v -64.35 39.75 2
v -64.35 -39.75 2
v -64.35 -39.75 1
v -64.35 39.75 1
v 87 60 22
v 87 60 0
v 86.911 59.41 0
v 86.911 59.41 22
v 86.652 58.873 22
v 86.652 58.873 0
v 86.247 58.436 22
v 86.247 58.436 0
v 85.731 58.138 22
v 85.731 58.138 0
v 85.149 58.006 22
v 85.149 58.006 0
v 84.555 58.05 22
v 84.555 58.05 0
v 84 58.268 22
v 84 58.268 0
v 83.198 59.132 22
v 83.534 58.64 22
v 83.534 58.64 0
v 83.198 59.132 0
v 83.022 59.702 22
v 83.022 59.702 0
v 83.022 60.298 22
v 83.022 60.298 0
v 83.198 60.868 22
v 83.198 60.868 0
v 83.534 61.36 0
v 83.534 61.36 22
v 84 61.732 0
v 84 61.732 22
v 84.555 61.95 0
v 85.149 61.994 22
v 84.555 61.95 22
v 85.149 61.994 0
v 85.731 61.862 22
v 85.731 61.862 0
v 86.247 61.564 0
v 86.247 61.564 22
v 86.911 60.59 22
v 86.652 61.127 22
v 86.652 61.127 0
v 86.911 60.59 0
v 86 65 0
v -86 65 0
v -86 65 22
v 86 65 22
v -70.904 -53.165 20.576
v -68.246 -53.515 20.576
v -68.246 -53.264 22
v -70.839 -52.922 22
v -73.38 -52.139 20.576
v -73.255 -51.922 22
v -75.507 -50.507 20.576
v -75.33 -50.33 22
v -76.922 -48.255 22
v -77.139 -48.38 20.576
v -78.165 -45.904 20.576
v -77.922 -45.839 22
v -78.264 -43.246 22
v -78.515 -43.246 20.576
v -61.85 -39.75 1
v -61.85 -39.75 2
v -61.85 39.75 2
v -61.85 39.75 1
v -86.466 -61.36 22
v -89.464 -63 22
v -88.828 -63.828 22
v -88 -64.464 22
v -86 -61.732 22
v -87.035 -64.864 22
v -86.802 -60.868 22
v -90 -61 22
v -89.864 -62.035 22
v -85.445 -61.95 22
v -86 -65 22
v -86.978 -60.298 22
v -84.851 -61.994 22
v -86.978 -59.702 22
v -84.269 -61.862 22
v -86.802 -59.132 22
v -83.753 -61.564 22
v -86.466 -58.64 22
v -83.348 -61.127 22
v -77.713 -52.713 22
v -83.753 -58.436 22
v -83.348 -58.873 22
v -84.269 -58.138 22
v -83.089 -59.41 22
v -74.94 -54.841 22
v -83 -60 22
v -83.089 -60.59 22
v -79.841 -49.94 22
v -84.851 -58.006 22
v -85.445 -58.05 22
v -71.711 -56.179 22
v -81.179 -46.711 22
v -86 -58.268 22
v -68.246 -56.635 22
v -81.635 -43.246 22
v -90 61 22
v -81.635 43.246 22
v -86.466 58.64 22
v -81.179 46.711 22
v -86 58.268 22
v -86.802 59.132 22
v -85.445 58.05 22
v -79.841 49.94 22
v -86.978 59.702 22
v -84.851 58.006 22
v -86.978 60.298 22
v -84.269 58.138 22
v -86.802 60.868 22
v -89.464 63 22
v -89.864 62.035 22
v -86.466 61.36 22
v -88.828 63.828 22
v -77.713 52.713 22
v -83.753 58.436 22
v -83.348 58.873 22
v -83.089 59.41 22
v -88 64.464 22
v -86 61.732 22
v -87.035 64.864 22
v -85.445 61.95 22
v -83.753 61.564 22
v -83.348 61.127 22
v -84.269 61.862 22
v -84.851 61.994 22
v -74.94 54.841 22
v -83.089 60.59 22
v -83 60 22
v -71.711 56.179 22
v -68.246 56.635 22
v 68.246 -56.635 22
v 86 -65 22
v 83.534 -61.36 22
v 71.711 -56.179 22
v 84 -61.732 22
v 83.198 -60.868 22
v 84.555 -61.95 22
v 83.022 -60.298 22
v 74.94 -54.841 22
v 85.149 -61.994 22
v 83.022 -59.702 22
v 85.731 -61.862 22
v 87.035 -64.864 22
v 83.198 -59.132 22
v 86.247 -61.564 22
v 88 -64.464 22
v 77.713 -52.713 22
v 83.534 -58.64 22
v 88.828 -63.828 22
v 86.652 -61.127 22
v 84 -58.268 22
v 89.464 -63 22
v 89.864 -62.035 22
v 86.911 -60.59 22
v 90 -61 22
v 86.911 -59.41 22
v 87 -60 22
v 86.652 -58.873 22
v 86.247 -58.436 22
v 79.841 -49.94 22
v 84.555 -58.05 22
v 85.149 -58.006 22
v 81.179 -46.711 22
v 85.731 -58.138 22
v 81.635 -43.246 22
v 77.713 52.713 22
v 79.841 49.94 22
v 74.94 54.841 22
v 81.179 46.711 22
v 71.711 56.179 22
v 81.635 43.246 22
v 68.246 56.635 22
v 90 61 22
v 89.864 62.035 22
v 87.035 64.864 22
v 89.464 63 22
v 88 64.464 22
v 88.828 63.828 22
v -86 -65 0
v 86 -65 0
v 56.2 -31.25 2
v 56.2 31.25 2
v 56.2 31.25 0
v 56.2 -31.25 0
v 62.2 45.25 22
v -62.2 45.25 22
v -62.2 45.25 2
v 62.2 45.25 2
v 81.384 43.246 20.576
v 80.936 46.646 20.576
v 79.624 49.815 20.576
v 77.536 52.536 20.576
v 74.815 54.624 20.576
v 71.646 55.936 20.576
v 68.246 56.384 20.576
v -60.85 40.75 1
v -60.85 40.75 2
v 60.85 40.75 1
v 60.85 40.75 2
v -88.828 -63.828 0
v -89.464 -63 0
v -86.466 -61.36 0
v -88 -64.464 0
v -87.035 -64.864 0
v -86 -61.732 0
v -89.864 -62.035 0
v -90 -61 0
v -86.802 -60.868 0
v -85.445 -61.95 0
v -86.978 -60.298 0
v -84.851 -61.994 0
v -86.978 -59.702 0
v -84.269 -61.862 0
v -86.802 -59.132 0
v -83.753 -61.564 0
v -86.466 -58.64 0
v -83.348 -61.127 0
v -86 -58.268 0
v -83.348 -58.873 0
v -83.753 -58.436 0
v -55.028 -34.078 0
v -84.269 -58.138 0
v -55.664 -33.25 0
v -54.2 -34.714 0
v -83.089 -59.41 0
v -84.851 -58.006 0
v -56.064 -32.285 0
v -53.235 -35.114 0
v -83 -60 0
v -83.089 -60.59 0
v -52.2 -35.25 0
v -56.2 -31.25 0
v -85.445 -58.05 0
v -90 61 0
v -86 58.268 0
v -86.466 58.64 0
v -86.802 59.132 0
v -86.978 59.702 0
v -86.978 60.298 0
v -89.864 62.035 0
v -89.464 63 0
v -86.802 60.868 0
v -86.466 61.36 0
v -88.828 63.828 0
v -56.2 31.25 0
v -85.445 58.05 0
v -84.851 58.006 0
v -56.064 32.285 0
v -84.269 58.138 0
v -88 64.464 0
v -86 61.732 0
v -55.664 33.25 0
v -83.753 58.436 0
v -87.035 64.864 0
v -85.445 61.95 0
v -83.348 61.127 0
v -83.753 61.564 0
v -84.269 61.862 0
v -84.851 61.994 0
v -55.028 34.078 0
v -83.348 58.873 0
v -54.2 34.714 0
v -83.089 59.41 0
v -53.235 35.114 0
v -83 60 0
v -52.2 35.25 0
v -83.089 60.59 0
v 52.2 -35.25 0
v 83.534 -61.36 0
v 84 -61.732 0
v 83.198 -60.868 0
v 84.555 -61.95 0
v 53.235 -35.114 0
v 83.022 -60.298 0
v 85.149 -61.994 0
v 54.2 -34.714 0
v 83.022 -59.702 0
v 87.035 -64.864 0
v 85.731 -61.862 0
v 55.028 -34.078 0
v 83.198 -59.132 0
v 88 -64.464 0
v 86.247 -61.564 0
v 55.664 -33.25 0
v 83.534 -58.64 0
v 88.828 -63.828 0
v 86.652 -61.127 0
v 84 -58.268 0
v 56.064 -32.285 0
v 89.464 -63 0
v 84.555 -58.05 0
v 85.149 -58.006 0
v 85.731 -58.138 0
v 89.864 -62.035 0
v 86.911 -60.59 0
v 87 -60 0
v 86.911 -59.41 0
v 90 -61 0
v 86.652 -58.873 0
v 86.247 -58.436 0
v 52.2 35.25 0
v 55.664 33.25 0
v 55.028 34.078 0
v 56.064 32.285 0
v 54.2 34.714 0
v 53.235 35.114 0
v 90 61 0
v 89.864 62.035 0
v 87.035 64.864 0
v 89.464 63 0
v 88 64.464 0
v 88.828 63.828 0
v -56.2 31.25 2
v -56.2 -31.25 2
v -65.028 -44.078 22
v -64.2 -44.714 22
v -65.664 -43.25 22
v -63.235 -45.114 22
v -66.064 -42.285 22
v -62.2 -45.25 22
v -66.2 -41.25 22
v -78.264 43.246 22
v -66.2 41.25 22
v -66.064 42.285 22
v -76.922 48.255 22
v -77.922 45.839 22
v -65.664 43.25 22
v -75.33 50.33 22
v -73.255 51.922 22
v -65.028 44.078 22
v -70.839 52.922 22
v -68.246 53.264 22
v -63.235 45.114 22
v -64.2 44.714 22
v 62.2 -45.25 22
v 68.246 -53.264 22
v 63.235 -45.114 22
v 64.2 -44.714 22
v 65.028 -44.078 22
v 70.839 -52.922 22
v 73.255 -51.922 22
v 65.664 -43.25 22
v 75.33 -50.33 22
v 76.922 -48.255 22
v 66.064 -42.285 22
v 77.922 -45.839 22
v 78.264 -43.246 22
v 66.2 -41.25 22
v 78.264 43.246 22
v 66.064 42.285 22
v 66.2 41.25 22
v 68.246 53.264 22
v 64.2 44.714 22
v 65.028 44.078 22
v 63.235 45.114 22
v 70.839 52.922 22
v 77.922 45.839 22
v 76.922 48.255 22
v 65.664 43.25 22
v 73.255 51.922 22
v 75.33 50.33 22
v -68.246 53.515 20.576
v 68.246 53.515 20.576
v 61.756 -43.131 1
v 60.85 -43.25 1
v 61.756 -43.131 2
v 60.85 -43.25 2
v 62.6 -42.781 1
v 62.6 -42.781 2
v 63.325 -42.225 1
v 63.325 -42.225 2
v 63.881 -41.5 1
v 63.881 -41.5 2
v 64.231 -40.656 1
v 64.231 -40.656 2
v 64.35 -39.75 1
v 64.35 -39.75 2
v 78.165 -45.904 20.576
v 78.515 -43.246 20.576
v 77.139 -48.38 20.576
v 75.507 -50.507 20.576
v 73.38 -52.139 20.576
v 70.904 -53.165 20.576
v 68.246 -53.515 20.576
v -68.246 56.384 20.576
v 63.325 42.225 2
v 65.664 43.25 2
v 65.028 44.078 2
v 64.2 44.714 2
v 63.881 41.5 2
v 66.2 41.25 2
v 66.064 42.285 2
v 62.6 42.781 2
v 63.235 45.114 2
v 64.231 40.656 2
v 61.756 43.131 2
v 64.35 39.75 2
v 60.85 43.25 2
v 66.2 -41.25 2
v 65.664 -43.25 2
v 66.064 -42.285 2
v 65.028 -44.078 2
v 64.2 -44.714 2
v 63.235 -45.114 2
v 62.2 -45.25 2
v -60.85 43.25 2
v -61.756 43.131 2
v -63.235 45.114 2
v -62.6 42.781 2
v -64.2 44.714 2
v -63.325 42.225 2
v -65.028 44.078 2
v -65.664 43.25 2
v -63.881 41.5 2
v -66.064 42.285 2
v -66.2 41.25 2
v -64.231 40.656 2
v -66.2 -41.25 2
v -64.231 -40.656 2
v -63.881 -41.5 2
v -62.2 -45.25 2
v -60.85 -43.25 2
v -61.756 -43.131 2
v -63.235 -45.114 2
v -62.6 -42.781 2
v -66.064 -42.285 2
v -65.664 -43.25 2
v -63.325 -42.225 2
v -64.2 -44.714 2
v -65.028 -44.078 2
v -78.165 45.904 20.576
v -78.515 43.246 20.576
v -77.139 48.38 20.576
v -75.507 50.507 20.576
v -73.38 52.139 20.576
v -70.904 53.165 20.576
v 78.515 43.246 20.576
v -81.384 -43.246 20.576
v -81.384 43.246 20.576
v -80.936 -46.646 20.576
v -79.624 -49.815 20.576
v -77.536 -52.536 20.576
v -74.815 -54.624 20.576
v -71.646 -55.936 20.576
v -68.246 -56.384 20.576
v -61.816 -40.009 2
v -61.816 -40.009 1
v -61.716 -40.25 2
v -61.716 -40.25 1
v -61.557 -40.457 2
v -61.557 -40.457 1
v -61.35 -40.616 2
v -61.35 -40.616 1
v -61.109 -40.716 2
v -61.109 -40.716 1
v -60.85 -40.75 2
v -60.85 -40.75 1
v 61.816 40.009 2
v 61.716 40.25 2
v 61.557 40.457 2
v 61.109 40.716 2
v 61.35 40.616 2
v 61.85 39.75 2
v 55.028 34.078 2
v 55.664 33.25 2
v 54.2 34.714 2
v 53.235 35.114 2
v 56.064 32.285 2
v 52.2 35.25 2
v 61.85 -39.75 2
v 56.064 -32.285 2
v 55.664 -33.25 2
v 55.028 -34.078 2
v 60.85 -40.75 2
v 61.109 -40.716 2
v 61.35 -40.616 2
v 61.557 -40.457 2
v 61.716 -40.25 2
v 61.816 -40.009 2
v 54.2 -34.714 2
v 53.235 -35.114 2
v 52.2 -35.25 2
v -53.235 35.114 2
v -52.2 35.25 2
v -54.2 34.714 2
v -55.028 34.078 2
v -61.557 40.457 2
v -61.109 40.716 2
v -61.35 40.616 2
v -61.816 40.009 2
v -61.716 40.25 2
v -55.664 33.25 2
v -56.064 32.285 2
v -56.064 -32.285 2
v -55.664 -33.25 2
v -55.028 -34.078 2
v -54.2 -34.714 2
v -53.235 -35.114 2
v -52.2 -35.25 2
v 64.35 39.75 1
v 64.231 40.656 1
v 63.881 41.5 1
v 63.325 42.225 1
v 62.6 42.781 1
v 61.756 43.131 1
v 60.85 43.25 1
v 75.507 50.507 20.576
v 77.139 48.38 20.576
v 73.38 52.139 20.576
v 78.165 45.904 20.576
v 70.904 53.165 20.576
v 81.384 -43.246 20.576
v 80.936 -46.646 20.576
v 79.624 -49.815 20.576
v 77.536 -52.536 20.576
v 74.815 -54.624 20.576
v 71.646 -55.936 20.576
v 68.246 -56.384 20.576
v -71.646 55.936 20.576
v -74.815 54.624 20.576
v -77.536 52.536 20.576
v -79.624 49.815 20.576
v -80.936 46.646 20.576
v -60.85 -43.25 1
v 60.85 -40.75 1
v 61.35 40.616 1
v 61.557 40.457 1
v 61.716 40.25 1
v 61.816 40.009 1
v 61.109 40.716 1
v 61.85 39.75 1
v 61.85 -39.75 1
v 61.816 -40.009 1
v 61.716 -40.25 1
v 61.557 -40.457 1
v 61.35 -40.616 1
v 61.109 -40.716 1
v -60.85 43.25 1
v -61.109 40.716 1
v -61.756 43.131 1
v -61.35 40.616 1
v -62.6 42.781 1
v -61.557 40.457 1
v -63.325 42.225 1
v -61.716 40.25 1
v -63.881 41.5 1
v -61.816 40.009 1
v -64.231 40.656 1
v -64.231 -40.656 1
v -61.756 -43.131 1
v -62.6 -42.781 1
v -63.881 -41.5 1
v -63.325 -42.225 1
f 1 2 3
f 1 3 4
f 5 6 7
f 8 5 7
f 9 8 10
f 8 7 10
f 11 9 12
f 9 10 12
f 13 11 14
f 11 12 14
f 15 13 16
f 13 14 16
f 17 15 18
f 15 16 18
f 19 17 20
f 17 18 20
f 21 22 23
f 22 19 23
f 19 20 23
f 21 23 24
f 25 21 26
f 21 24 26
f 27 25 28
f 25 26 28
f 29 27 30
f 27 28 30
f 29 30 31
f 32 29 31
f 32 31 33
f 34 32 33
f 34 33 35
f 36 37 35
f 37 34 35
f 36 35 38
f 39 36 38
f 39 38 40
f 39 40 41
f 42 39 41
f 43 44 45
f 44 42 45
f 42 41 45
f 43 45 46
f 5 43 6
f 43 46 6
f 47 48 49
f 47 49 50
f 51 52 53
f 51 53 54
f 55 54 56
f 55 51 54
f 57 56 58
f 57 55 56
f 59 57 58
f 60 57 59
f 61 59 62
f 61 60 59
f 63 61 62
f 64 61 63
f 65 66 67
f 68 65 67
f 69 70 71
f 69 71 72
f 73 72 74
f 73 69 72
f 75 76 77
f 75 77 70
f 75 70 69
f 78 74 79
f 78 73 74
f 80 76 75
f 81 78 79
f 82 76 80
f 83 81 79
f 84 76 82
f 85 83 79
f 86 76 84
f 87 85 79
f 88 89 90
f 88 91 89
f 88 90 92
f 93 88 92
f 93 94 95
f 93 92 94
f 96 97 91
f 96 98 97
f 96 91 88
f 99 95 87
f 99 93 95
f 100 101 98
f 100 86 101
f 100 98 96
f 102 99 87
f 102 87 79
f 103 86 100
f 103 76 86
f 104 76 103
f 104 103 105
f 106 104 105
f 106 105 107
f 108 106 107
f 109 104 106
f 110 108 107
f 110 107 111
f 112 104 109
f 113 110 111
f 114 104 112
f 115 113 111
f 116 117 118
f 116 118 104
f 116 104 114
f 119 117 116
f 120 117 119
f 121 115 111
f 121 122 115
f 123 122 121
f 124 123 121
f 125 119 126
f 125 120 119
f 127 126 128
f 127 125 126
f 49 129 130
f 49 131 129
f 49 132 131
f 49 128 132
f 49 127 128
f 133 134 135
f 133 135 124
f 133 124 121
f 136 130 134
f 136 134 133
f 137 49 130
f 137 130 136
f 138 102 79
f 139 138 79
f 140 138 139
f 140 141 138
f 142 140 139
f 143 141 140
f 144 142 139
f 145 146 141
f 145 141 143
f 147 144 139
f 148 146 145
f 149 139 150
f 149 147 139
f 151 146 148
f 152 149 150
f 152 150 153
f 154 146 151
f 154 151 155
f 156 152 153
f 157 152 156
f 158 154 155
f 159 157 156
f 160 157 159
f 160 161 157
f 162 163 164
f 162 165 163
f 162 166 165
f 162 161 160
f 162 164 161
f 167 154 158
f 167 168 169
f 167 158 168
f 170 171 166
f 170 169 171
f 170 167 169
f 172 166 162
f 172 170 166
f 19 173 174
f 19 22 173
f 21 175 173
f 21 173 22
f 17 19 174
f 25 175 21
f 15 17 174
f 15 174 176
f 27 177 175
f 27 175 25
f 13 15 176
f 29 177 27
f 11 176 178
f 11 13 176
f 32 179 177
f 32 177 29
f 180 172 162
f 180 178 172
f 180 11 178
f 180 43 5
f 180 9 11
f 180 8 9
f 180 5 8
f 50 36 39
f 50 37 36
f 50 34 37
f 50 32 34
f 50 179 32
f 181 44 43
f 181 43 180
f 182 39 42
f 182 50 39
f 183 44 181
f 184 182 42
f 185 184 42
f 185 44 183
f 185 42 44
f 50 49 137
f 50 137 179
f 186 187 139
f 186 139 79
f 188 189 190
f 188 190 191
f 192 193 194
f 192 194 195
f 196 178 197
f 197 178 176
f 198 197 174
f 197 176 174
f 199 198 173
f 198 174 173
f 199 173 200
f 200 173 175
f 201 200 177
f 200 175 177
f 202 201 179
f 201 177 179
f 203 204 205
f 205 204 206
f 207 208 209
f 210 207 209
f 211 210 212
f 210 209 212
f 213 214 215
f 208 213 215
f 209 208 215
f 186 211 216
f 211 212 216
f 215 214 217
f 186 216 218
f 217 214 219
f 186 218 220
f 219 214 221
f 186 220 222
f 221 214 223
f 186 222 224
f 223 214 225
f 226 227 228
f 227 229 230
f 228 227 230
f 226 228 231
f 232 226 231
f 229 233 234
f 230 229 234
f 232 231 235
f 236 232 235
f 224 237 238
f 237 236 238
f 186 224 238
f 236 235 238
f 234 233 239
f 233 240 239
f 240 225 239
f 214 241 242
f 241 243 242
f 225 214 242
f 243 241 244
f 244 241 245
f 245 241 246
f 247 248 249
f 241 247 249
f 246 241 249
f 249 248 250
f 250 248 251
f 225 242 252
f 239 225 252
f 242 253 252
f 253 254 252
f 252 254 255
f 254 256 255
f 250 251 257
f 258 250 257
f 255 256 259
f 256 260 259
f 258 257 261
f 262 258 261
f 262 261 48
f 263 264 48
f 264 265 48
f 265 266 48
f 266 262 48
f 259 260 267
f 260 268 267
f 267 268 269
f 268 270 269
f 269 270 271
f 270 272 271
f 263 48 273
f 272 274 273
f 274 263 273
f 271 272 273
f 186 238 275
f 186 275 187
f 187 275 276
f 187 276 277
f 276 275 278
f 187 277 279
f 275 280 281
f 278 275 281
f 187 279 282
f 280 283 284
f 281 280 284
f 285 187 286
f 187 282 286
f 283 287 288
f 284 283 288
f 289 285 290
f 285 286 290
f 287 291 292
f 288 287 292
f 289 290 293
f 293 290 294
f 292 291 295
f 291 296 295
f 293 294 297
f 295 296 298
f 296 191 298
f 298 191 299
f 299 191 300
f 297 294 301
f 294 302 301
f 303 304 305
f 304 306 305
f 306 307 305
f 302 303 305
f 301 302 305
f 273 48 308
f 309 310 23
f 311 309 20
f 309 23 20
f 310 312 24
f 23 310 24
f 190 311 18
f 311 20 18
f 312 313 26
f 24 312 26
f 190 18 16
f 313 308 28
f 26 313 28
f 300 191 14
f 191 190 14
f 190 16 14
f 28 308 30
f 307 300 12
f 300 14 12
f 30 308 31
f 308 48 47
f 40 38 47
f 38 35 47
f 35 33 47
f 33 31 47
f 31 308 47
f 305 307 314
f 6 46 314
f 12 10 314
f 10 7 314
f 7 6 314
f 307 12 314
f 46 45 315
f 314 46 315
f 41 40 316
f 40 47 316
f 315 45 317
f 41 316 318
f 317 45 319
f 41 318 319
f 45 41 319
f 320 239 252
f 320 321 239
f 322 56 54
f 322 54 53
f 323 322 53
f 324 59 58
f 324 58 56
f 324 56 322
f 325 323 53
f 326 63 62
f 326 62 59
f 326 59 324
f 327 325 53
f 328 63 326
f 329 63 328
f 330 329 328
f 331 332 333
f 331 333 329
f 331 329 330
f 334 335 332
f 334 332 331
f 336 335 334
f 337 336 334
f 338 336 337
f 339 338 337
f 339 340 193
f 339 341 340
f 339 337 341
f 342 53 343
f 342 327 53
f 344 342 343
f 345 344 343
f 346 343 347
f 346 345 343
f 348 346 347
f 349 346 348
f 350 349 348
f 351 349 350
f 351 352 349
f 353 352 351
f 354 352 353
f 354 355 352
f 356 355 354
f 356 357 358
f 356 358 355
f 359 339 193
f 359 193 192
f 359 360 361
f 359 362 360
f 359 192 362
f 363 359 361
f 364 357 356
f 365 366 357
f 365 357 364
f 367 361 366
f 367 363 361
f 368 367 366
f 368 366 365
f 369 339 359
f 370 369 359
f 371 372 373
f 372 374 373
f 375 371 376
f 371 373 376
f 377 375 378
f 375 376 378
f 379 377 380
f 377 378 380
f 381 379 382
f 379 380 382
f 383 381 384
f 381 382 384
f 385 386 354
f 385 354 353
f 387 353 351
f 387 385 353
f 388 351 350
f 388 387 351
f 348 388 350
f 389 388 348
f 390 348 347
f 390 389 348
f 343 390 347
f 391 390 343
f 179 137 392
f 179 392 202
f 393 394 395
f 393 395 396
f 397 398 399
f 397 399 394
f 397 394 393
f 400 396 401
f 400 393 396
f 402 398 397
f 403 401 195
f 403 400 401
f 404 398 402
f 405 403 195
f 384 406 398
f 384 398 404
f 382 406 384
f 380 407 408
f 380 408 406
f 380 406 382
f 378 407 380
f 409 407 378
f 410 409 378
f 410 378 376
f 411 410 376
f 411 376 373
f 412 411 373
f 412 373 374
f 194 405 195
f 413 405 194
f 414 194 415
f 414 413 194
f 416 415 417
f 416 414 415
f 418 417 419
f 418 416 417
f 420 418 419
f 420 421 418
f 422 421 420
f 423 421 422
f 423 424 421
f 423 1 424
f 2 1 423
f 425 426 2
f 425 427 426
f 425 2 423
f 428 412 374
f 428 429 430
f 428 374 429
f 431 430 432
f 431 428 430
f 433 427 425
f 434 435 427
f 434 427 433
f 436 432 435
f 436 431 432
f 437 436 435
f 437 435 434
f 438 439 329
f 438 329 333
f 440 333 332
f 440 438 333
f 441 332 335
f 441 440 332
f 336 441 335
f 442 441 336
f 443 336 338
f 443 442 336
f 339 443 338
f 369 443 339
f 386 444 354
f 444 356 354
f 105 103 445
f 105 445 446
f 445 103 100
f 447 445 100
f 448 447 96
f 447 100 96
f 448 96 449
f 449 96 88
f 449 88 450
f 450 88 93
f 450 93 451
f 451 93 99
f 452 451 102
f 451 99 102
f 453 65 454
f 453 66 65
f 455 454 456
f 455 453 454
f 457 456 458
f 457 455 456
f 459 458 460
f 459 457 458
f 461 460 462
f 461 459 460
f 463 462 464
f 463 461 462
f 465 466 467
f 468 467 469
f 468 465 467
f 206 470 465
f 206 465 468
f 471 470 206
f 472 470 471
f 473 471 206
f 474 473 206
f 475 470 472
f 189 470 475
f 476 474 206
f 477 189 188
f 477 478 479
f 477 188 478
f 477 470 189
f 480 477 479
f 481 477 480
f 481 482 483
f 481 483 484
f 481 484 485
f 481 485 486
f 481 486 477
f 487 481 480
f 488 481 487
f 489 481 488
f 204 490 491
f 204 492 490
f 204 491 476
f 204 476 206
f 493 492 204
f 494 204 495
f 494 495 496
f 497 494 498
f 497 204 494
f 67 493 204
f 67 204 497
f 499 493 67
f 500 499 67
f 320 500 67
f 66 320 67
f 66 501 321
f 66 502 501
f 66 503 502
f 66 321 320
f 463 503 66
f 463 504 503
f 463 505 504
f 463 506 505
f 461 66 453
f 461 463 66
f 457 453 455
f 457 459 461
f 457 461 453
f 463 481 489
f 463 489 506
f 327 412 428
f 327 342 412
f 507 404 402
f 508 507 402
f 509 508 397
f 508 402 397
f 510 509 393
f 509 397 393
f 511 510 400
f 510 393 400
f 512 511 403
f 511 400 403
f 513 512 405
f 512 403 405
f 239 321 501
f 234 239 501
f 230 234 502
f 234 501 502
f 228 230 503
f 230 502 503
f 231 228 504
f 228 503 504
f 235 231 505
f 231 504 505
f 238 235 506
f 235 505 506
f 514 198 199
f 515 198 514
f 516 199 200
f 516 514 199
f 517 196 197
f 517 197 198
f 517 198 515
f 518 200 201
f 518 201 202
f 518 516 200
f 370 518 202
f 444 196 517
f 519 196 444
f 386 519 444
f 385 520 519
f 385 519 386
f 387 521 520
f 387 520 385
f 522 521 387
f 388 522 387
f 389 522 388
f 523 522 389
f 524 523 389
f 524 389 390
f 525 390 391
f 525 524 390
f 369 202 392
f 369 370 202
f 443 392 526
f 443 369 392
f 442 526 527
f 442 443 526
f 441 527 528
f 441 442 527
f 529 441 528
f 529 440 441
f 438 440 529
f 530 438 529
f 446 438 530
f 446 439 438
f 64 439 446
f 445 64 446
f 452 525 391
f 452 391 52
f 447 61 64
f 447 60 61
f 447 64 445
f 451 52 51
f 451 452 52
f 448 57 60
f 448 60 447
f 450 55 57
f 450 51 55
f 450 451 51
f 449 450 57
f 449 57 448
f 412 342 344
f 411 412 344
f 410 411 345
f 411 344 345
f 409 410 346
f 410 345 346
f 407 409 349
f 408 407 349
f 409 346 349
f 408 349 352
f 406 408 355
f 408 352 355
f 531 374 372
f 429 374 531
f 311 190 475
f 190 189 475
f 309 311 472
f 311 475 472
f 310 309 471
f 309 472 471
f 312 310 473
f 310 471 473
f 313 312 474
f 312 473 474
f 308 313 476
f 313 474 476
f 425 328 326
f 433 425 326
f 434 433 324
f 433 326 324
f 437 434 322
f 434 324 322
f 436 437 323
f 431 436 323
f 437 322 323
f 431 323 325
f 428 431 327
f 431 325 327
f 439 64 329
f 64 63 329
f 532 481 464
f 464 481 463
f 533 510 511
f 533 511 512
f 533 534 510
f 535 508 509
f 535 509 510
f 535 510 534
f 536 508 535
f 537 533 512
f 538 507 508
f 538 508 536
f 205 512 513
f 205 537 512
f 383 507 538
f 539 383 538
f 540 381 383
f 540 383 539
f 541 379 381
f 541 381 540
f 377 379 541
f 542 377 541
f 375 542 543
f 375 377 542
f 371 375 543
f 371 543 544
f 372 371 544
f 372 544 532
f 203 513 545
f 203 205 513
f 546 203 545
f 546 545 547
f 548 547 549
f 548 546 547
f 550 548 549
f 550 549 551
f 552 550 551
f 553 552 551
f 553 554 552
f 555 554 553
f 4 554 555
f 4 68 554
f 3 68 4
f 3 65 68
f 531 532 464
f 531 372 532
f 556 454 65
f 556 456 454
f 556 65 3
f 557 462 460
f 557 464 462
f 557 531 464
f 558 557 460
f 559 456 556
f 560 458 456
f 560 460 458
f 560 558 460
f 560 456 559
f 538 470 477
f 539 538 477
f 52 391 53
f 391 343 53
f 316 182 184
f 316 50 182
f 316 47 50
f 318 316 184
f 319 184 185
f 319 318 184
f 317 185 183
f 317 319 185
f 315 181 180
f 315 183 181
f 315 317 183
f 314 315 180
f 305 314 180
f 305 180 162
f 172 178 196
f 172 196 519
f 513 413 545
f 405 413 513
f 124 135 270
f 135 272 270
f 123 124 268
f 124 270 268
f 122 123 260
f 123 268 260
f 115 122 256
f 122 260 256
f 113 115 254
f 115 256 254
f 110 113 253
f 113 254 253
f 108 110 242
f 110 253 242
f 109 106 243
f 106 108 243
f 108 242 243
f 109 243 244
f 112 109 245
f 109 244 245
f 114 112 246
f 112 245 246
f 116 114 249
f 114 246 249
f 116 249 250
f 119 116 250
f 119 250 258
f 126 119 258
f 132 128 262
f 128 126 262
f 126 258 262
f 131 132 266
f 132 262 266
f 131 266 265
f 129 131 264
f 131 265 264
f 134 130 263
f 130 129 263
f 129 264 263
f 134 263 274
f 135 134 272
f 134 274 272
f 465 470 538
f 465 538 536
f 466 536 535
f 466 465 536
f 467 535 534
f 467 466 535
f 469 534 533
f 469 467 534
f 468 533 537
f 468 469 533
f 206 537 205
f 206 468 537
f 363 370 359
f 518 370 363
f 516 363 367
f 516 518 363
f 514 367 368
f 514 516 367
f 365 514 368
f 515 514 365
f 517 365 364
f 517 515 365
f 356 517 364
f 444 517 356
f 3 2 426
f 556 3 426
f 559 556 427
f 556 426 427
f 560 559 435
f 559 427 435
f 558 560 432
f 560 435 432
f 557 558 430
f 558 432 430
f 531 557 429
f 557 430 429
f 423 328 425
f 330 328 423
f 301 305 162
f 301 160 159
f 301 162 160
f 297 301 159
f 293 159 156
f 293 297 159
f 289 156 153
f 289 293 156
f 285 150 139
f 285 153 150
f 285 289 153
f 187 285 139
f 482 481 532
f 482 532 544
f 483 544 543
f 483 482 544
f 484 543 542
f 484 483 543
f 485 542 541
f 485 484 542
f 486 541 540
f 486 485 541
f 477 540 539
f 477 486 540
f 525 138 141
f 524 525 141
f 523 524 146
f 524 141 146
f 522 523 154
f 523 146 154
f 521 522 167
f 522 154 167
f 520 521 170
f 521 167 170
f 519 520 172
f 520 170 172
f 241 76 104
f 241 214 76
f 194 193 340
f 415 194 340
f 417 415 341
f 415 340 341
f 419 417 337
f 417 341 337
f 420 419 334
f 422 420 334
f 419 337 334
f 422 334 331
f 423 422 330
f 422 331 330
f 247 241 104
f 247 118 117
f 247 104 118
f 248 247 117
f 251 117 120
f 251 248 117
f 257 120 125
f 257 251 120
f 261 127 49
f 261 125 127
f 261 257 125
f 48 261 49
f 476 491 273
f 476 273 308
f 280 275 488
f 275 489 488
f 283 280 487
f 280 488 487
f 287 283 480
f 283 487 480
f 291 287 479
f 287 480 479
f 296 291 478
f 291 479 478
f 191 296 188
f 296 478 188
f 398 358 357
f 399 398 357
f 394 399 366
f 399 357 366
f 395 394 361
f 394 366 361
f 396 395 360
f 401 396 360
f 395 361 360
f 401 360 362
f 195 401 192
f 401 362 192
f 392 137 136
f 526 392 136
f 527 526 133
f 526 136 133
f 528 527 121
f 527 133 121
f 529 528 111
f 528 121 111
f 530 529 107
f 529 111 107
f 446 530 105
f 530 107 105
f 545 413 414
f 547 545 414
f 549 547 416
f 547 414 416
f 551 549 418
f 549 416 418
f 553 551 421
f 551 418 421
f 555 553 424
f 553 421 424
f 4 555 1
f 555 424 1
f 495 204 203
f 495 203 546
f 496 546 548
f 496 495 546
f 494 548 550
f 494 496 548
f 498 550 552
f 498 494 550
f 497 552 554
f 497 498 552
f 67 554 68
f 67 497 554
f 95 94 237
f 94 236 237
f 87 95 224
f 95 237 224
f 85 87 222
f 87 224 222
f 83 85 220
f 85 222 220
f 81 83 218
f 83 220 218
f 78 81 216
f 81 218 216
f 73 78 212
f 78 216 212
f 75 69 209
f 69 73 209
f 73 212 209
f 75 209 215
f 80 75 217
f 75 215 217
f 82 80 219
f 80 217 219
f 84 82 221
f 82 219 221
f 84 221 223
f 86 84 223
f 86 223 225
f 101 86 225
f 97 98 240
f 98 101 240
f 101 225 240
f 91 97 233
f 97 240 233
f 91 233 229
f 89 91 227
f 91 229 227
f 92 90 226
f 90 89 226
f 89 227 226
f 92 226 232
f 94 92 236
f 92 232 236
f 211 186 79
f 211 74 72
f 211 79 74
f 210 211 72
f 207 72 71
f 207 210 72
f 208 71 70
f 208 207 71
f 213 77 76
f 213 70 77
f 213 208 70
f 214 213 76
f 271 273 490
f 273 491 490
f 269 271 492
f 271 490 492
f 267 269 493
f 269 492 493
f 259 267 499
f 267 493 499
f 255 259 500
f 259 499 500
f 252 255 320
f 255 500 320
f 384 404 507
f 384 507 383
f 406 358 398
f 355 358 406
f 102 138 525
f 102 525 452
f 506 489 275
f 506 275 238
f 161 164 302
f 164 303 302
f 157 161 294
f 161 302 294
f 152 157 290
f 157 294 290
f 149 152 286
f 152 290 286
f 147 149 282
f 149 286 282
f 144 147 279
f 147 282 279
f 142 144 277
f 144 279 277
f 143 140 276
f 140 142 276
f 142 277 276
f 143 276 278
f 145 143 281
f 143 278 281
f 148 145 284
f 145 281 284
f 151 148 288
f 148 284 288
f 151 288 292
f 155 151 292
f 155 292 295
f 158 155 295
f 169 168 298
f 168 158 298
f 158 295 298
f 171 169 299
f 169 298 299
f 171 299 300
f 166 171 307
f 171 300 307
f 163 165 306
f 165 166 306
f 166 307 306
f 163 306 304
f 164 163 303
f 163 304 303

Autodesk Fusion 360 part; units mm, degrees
sketch "Sketch1" plane through (0, 0, 0) normal (0, 0, 1) x (1, 0, 0)
  line L0 (86, -65) -> (-86, -65)
  line L1 (-90, -61) -> (-90, 61)
  line L2 (-86, 65) -> (86, 65)
  line L3 (90, 61) -> (90, -61)
  line L4 (90, -65) -> (-90, 65) construction
  line L5 (-90, -65) -> (90, 65) construction
  arc A0 (-86, 65) -> (-90, 61) centre (-86, 61) ccw
  arc A1 (90, 61) -> (86, 65) centre (86, 61) ccw
  arc A2 (86, -65) -> (90, -61) centre (86, -61) ccw
  arc A3 (-90, -61) -> (-86, -65) centre (-86, -61) ccw
  circle A4 centre (-85, 60) radius 2
  line L6 (0, 65) -> (0, -65) construction
  line L7 (90, 0) -> (-90, 0) construction
  circle A5 centre (85, 60) radius 2
  circle A6 centre (85, -60) radius 2
  circle A7 centre (-85, -60) radius 2
  dimension "d1" = 180
  dimension "d2" = 130
  dimension "d26" = 4
  dimension "d27" = 4
  dimension "d28" = 4
  dimension "d29" = 4
  dimension "d30" = 4
  dimension "d31" = 5
  dimension "d32" = 5
extrude "Extrude1" add sketch "Sketch1" along normal blind 22
sketch "Sketch2" plane through (0, 0, 22) normal (0, 0, 1) x (-1, 0, 0)
  line L0 (-86, -65) -> (86, -65)
  line L1 (90, -61) -> (90, 61)
  line L2 (86, 65) -> (-86, 65)
  line L3 (-90, 61) -> (-90, -61)
  line L4 (-62.2, 45.25) -> (62.2, 45.25)
  line L5 (66.2, 41.25) -> (66.2, -41.25)
  line L6 (62.2, -45.25) -> (-62.2, -45.25)
  line L7 (-66.2, -41.25) -> (-66.2, 41.25)
  line L8 (-66.2, 45.25) -> (66.2, -45.25) construction
  line L9 (66.2, 45.25) -> (-66.2, -45.25) construction
  arc A0 (86, -65) -> (90, -61) centre (86, -61) ccw
  arc A1 (90, 61) -> (86, 65) centre (86, 61) ccw
  arc A2 (-86, 65) -> (-90, 61) centre (-86, 61) ccw
  arc A3 (-90, -61) -> (-86, -65) centre (-86, -61) ccw
  circle A4 centre (85, 60) radius 2
  circle A5 centre (-85, 60) radius 2
  circle A6 centre (-85, -60) radius 2
  circle A7 centre (85, -60) radius 2
  arc A8 (62.2, -45.25) -> (66.2, -41.25) centre (62.2, -41.25) ccw
  arc A9 (-66.2, -41.25) -> (-62.2, -45.25) centre (-62.2, -41.25) ccw
  arc A10 (66.2, 41.25) -> (62.2, 45.25) centre (62.2, 41.25) ccw
  arc A11 (-62.2, 45.25) -> (-66.2, 41.25) centre (-62.2, 41.25) ccw
  dimension "d5" = 132.4
  dimension "d6" = 90.5
  dimension "d52" = 4
  dimension "d53" = 4
  dimension "d54" = 4
  dimension "d55" = 4
extrude "Extrude2" cut sketch "Sketch2" against normal blind 20 contours L4 L5 L6 L7 A8 A9 A10 A11
sketch "Sketch3" plane through (0, 0, 22) normal (0, 0, 1) x (-1, 0, 0)
  line L0 (66.2, 41.25) -> (66.2, -41.25)
  line L1 (62.2, -45.25) -> (-62.2, -45.25)
  line L2 (-66.2, -41.25) -> (-66.2, 41.25)
  line L3 (-62.2, 45.25) -> (62.2, 45.25)
  line L4 (-86, -65) -> (86, -65)
  line L5 (90, -61) -> (90, 61)
  line L6 (86, 65) -> (-86, 65)
  line L7 (-90, 61) -> (-90, -61)
  line L8 (-79.9494, 54.9494) -> (79.9494, 54.9494) construction
  line L9 (79.9494, 54.9494) -> (79.9494, -54.9494) construction
  line L10 (79.9494, -54.9494) -> (-79.9494, -54.9494) construction
  line L11 (-79.9494, -54.9494) -> (-79.9494, 54.9494) construction
  line L12 (-79.9494, 54.9494) -> (79.9494, -54.9494) construction
  line L13 (79.9494, 54.9494) -> (-79.9494, -54.9494) construction
  line L14 (78.5149, 43.2459) -> (78.5149, -43.2459)
  line L15 (68.2459, -53.5149) -> (-68.2459, -53.5149)
  line L16 (-78.5149, -43.2459) -> (-78.5149, 43.2459)
  line L17 (-69.5341, 47.3937) -> (78.5149, -53.5149) construction
  line L18 (70.6619, 45.6619) -> (-70.6619, -45.6619) construction
  line L19 (-68.2459, 56.3839) -> (68.2459, 56.3839)
  line L20 (81.3839, 43.2459) -> (81.3839, -43.2459)
  line L21 (68.2459, -56.3839) -> (-68.2459, -56.3839)
  line L22 (-81.3839, -43.2459) -> (-81.3839, 43.2459)
  line L23 (-72.429, 50.1798) -> (81.3839, -56.3839) construction
  line L24 (73.5309, 48.5309) -> (-73.5309, -48.5309) construction
  arc A0 (68.2459, -53.5149) -> (78.5149, -43.2459) centre (68.2459, -43.2459) ccw
  arc A1 (68.2459, -56.3839) -> (81.3839, -43.2459) centre (68.2459, -43.2459) ccw
  line L25 (0, -65) -> (0, 65) construction
  line L26 (-90, 0) -> (90, 0) construction
  arc A2 (-78.5149, -43.2459) -> (-68.2459, -53.5149) centre (-68.2459, -43.2459) ccw
  arc A3 (-81.3839, -43.2459) -> (-68.2459, -56.3839) centre (-68.2459, -43.2459) ccw
  arc A4 (-68.2459, 53.5149) -> (-78.5149, 43.2459) centre (-68.2459, 43.2459) ccw
  arc A5 (-68.2459, 56.3839) -> (-81.3839, 43.2459) centre (-68.2459, 43.2459) ccw
  arc A6 (78.5149, 43.2459) -> (68.2459, 53.5149) centre (68.2459, 43.2459) ccw
  arc A7 (81.3839, 43.2459) -> (68.2459, 56.3839) centre (68.2459, 43.2459) ccw
  line L27 (-68.2459, 53.5149) -> (68.2459, 53.5149)
  arc A8 (86, -65) -> (90, -61) centre (86, -61) ccw
  arc A9 (90, 61) -> (86, 65) centre (86, 61) ccw
  arc A10 (-86, 65) -> (-90, 61) centre (-86, 61) ccw
  arc A11 (-90, -61) -> (-86, -65) centre (-86, -61) ccw
  circle A12 centre (85, 60) radius 2
  circle A13 centre (-85, 60) radius 2
  circle A14 centre (-85, -60) radius 2
  circle A15 centre (85, -60) radius 2
  arc A16 (66.2, 41.25) -> (62.2, 45.25) centre (62.2, 41.25) ccw
  arc A17 (62.2, -45.25) -> (66.2, -41.25) centre (62.2, -41.25) ccw
  arc A18 (-66.2, -41.25) -> (-62.2, -45.25) centre (-62.2, -41.25) ccw
  arc A19 (-62.2, 45.25) -> (-66.2, 41.25) centre (-62.2, 41.25) ccw
  dimension "d9" = 159.8988
  dimension "d15" = 109.8988
  dimension "d16" = 1.4345
  dimension "d17" = 1.4345
  dimension "d18" = 1.4345
  dimension "d19" = 1.4345
  dimension "d20" = 10.269
  dimension "d21" = 13.138
extrude "Extrude3" cut sketch "Sketch3" against normal blind 1.424 contours L19 L20 L21 L22 A1 A3 A5 A7
draft "Draft1" angle 10 neutral plane through (0, 0, 20.576) pull (0, 0, 1) 16 faces at (-78.5149, -14.4153, 21.5253) (-70.6669, 53.2254, 21.0507) (-22.7486, 53.5149, 21.5253) (74.2025, 51.6108, 21.0507) (78.5149, 14.4153, 21.0507) (71.6046, -52.9501, 21.5253) (22.7486, -53.5149, 21.5253) (-70.6669, -53.2254, 21.0507) (-81.3839, -14.4153, 21.5253) (-68.871, -56.369, 21.0507) (22.7486, -56.3839, 21.0507) (77.7543, -52.3122, 21.0507) (81.3839, 14.4153, 21.5253) (77.3122, 52.7543, 21.0507) (-22.7486, 56.3839, 21.0507) (-73.1288, 55.4428, 21.0507)
sketch "Sketch4" plane through (0, 0, 2) normal (0, 0, 1) x (-1, 0, 0)
  line L0 (-62.2, -45.25) -> (62.2, -45.25)
  line L1 (66.2, -41.25) -> (66.2, 41.25)
  line L2 (62.2, 45.25) -> (-62.2, 45.25)
  line L3 (-66.2, 41.25) -> (-66.2, -41.25)
  line L4 (-52.2, 35.25) -> (52.2, 35.25)
  line L5 (56.2, 31.25) -> (56.2, -31.25)
  line L6 (52.2, -35.25) -> (-52.2, -35.25)
  line L7 (-56.2, -31.25) -> (-56.2, 31.25)
  line L8 (-56.2, 35.25) -> (56.2, -35.25) construction
  line L9 (56.2, 35.25) -> (-56.2, -35.25) construction
  arc A0 (66.2, 41.25) -> (62.2, 45.25) centre (62.2, 41.25) ccw
  arc A1 (-62.2, 45.25) -> (-66.2, 41.25) centre (-62.2, 41.25) ccw
  arc A2 (-66.2, -41.25) -> (-62.2, -45.25) centre (-62.2, -41.25) ccw
  arc A3 (62.2, -45.25) -> (66.2, -41.25) centre (62.2, -41.25) ccw
  arc A4 (52.2, -35.25) -> (56.2, -31.25) centre (52.2, -31.25) ccw
  arc A5 (-56.2, -31.25) -> (-52.2, -35.25) centre (-52.2, -31.25) ccw
  arc A6 (-52.2, 35.25) -> (-56.2, 31.25) centre (-52.2, 31.25) ccw
  arc A7 (56.2, 31.25) -> (52.2, 35.25) centre (52.2, 31.25) ccw
  dimension "d35" = 10
  dimension "d36" = 10
  dimension "d71" = 4
  dimension "d72" = 4
  dimension "d73" = 4
  dimension "d74" = 4
extrude "Extrude4" cut sketch "Sketch4" against normal blind 5 contours L4 L5 L6 L7 A4 A5 A6 A7
sketch "Sketch6" plane through (0, 0, 2) normal (0, 0, 1) x (-1, 0, 0)
  line L0 (56.2, 31.25) -> (56.2, -31.25)
  line L1 (52.2, -35.25) -> (-52.2, -35.25)
  line L2 (-56.2, -31.25) -> (-56.2, 31.25)
  line L3 (-52.2, 35.25) -> (52.2, 35.25)
  arc A0 (66.2, 41.25) -> (62.2, 45.25) centre (62.2, 41.25) ccw
  line L4 (62.2, 45.25) -> (-62.2, 45.25)
  arc A1 (-62.2, 45.25) -> (-66.2, 41.25) centre (-62.2, 41.25) ccw
  line L5 (-66.2, 41.25) -> (-66.2, -41.25)
  arc A2 (-66.2, -41.25) -> (-62.2, -45.25) centre (-62.2, -41.25) ccw
  line L6 (-62.2, -45.25) -> (62.2, -45.25)
  arc A3 (62.2, -45.25) -> (66.2, -41.25) centre (62.2, -41.25) ccw
  line L7 (66.2, -41.25) -> (66.2, 41.25)
  arc A4 (60.9079, -41.3399) -> (62.4799, -39.7679) centre (60.9079, -39.7679) ccw construction
  arc A5 (-62.4799, -39.7399) -> (-60.9079, -41.3119) centre (-60.9079, -39.7399) ccw construction
  line L8 (-48.9575, -41.8399) -> (48.9575, -41.8399) construction
  line L9 (48.9575, 41.8399) -> (-48.9575, 41.8399) construction
  line L10 (-62.9799, 29.7119) -> (-62.9799, 27.8175) construction
  line L11 (48.9575, -41.8399) -> (50.8519, -41.8399) construction
  line L12 (62.4799, 30.3078) -> (62.4799, 39.7679) construction
  arc A6 (-60.88, 42.74) -> (-63.88, 39.74) centre (-60.88, 39.74) ccw construction
  line L13 (63.88, 39.74) -> (63.88, -39.74) construction
  arc A7 (63.88, 39.74) -> (60.88, 42.74) centre (60.88, 39.74) ccw construction
  line L14 (-62.9799, -29.7119) -> (-62.4799, -30.3078) construction
  line L15 (51.4478, 41.3399) -> (50.8519, 41.8399) construction
  arc A8 (60.88, -42.74) -> (63.88, -39.74) centre (60.88, -39.74) ccw construction
  line L16 (-48.9575, 41.8399) -> (-50.8519, 41.8399) construction
  line L17 (-60.88, 42.74) -> (60.88, 42.74) construction
  line L18 (-62.9799, -27.8175) -> (-62.9799, -29.7119) construction
  line L19 (60.88, -42.74) -> (-60.88, -42.74) construction
  line L20 (62.9799, 29.7119) -> (62.4799, 30.3078) construction
  line L21 (-50.8519, 41.8399) -> (-51.4811, 41.3119) construction
  line L22 (62.4799, -39.7679) -> (62.4799, -30.3078) construction
  line L23 (-50.8519, -41.8399) -> (-48.9575, -41.8399) construction
  line L24 (60.9079, 41.3399) -> (51.4478, 41.3399) construction
  line L25 (50.8519, 41.8399) -> (48.9575, 41.8399) construction
  line L26 (62.9799, 27.8175) -> (62.9799, 29.7119) construction
  line L27 (51.4478, -41.3399) -> (60.9079, -41.3399) construction
  line L28 (62.9799, -27.8175) -> (62.9799, 27.8175) construction
  line L29 (-63.88, -39.74) -> (-63.88, 39.74) construction
  line L30 (50.8519, -41.8399) -> (51.4478, -41.3399) construction
  line L31 (62.9799, -29.7119) -> (62.9799, -27.8175) construction
  arc A9 (-63.88, -39.74) -> (-60.88, -42.74) centre (-60.88, -39.74) ccw construction
  arc A10 (62.4799, 39.7679) -> (60.9079, 41.3399) centre (60.9079, 39.7679) ccw construction
  line L32 (62.4799, -30.3078) -> (62.9799, -29.7119) construction
  line L33 (-62.4799, 30.3078) -> (-62.9799, 29.7119) construction
  line L34 (-60.9079, -41.3119) -> (-51.4811, -41.3119) construction
  arc A11 (-60.9079, 41.3119) -> (-62.4799, 39.7399) centre (-60.9079, 39.7399) ccw construction
  line L35 (-51.4811, -41.3119) -> (-50.8519, -41.8399) construction
  line L36 (-51.4811, 41.3119) -> (-60.9079, 41.3119) construction
  line L37 (-62.4799, 39.7399) -> (-62.4799, 30.3078) construction
  line L38 (-62.4799, -30.3078) -> (-62.4799, -39.7399) construction
  line L39 (-62.9799, 27.8175) -> (-62.9799, -27.8175) construction
  line L40 (0, -45.25) -> (0, 45.25) construction
  line L41 (-66.2, 0) -> (66.2, 0) construction
  line L42 (-60.85, 43.25) -> (60.85, 43.25)
  line L43 (64.35, 39.75) -> (64.35, -39.75)
  line L44 (60.85, -43.25) -> (-60.85, -43.25)
  line L45 (-64.35, -39.75) -> (-64.35, 39.75)
  line L46 (-64.35, 43.25) -> (64.35, -43.25) construction
  line L47 (64.35, 43.25) -> (-64.35, -43.25) construction
  arc A12 (60.85, -43.25) -> (64.35, -39.75) centre (60.85, -39.75) ccw
  arc A13 (-64.35, -39.75) -> (-60.85, -43.25) centre (-60.85, -39.75) ccw
  arc A14 (-60.85, 43.25) -> (-64.35, 39.75) centre (-60.85, 39.75) ccw
  arc A15 (64.35, 39.75) -> (60.85, 43.25) centre (60.85, 39.75) ccw
  line L48 (-60.85, 40.75) -> (60.85, 40.75)
  line L49 (61.85, 39.75) -> (61.85, -39.75)
  line L50 (60.85, -40.75) -> (-60.85, -40.75)
  line L51 (-61.85, -39.75) -> (-61.85, 39.75)
  line L52 (-61.85, 40.75) -> (61.85, -40.75) construction
  line L53 (61.85, 40.75) -> (-61.85, -40.75) construction
  arc A16 (-61.85, -39.75) -> (-60.85, -40.75) centre (-60.85, -39.75) ccw
  arc A17 (60.85, -40.75) -> (61.85, -39.75) centre (60.85, -39.75) ccw
  arc A18 (61.85, 39.75) -> (60.85, 40.75) centre (60.85, 39.75) ccw
  arc A19 (-60.85, 40.75) -> (-61.85, 39.75) centre (-60.85, 39.75) ccw
  arc A20 (52.2, -35.25) -> (56.2, -31.25) centre (52.2, -31.25) ccw
  arc A21 (-56.2, -31.25) -> (-52.2, -35.25) centre (-52.2, -31.25) ccw
  arc A22 (-52.2, 35.25) -> (-56.2, 31.25) centre (-52.2, 31.25) ccw
  arc A23 (56.2, 31.25) -> (52.2, 35.25) centre (52.2, 31.25) ccw
  dimension "d56" = 128.7
  dimension "d57" = 86.5
  dimension "d58" = 3.5
  dimension "d59" = 3.5
  dimension "d60" = 3.5
  dimension "d61" = 3.5
  dimension "d63" = 2.5
  dimension "d64" = 2.5
  dimension "d65" = 1
  dimension "d66" = 1
  dimension "d67" = 1
  dimension "d68" = 1
extrude "Extrude6" cut sketch "Sketch6" against normal blind 1 contours L42 L43 L44 L45 A12 A13 A14 A15
equation "d9 = ( ORingPerimeter - 100 mm ) / 4 + 50 mm"
equation "ORingDiameter = 1.78 mm" comment "Diamter of the O ring"
equation "ORingInnerDiameter = 170 mm" comment "Inner diamter of the o ring bore"
equation "ORingPerimeter = 2 * 3.1412 * ( ( ORingInnerDiameter / 2 ) + ORingDiameter / 2 )"
equation "PanelWidth = 80 mm"
equation "PanelLength = 115 mm"
equation "d15 = ( ORingPerimeter - 100 mm ) / 4"
equation "d16 = ( ( ORingDiameter * 1.05 ) / 2 ) + 0.5 mm"
equation "d17 = ( ( ORingDiameter * 1.05 ) / 2 ) + 0.5 mm"
equation "d18 = ( ( ORingDiameter * 1.05 ) / 2 ) + 0.5 mm"
equation "d19 = ( ( ORingDiameter * 1.05 ) / 2 ) + 0.5 mm"
equation "d20 = ( ORingDiameter ) * 6 + ORingDiameter * 0.05 - 0.5 mm"
equation "d21 = ( ORingDiameter ) * 6 + ( ORingDiameter * 1.1 ) + 0.5 mm"
equation "d22 = -ORingDiameter * 0.8"
equation "ORing2Diameter = 2 mm" comment "Second O ring Diameter"
equation "ORing2InnerDiameter = 126 mm" comment "Inner diameter of the second O Ring"
equation "ORing2Perimeter = 2 * 3.1412 * ( ( ORing2InnerDiameter / 2 ) + ORing2Diameter / 2 )"
